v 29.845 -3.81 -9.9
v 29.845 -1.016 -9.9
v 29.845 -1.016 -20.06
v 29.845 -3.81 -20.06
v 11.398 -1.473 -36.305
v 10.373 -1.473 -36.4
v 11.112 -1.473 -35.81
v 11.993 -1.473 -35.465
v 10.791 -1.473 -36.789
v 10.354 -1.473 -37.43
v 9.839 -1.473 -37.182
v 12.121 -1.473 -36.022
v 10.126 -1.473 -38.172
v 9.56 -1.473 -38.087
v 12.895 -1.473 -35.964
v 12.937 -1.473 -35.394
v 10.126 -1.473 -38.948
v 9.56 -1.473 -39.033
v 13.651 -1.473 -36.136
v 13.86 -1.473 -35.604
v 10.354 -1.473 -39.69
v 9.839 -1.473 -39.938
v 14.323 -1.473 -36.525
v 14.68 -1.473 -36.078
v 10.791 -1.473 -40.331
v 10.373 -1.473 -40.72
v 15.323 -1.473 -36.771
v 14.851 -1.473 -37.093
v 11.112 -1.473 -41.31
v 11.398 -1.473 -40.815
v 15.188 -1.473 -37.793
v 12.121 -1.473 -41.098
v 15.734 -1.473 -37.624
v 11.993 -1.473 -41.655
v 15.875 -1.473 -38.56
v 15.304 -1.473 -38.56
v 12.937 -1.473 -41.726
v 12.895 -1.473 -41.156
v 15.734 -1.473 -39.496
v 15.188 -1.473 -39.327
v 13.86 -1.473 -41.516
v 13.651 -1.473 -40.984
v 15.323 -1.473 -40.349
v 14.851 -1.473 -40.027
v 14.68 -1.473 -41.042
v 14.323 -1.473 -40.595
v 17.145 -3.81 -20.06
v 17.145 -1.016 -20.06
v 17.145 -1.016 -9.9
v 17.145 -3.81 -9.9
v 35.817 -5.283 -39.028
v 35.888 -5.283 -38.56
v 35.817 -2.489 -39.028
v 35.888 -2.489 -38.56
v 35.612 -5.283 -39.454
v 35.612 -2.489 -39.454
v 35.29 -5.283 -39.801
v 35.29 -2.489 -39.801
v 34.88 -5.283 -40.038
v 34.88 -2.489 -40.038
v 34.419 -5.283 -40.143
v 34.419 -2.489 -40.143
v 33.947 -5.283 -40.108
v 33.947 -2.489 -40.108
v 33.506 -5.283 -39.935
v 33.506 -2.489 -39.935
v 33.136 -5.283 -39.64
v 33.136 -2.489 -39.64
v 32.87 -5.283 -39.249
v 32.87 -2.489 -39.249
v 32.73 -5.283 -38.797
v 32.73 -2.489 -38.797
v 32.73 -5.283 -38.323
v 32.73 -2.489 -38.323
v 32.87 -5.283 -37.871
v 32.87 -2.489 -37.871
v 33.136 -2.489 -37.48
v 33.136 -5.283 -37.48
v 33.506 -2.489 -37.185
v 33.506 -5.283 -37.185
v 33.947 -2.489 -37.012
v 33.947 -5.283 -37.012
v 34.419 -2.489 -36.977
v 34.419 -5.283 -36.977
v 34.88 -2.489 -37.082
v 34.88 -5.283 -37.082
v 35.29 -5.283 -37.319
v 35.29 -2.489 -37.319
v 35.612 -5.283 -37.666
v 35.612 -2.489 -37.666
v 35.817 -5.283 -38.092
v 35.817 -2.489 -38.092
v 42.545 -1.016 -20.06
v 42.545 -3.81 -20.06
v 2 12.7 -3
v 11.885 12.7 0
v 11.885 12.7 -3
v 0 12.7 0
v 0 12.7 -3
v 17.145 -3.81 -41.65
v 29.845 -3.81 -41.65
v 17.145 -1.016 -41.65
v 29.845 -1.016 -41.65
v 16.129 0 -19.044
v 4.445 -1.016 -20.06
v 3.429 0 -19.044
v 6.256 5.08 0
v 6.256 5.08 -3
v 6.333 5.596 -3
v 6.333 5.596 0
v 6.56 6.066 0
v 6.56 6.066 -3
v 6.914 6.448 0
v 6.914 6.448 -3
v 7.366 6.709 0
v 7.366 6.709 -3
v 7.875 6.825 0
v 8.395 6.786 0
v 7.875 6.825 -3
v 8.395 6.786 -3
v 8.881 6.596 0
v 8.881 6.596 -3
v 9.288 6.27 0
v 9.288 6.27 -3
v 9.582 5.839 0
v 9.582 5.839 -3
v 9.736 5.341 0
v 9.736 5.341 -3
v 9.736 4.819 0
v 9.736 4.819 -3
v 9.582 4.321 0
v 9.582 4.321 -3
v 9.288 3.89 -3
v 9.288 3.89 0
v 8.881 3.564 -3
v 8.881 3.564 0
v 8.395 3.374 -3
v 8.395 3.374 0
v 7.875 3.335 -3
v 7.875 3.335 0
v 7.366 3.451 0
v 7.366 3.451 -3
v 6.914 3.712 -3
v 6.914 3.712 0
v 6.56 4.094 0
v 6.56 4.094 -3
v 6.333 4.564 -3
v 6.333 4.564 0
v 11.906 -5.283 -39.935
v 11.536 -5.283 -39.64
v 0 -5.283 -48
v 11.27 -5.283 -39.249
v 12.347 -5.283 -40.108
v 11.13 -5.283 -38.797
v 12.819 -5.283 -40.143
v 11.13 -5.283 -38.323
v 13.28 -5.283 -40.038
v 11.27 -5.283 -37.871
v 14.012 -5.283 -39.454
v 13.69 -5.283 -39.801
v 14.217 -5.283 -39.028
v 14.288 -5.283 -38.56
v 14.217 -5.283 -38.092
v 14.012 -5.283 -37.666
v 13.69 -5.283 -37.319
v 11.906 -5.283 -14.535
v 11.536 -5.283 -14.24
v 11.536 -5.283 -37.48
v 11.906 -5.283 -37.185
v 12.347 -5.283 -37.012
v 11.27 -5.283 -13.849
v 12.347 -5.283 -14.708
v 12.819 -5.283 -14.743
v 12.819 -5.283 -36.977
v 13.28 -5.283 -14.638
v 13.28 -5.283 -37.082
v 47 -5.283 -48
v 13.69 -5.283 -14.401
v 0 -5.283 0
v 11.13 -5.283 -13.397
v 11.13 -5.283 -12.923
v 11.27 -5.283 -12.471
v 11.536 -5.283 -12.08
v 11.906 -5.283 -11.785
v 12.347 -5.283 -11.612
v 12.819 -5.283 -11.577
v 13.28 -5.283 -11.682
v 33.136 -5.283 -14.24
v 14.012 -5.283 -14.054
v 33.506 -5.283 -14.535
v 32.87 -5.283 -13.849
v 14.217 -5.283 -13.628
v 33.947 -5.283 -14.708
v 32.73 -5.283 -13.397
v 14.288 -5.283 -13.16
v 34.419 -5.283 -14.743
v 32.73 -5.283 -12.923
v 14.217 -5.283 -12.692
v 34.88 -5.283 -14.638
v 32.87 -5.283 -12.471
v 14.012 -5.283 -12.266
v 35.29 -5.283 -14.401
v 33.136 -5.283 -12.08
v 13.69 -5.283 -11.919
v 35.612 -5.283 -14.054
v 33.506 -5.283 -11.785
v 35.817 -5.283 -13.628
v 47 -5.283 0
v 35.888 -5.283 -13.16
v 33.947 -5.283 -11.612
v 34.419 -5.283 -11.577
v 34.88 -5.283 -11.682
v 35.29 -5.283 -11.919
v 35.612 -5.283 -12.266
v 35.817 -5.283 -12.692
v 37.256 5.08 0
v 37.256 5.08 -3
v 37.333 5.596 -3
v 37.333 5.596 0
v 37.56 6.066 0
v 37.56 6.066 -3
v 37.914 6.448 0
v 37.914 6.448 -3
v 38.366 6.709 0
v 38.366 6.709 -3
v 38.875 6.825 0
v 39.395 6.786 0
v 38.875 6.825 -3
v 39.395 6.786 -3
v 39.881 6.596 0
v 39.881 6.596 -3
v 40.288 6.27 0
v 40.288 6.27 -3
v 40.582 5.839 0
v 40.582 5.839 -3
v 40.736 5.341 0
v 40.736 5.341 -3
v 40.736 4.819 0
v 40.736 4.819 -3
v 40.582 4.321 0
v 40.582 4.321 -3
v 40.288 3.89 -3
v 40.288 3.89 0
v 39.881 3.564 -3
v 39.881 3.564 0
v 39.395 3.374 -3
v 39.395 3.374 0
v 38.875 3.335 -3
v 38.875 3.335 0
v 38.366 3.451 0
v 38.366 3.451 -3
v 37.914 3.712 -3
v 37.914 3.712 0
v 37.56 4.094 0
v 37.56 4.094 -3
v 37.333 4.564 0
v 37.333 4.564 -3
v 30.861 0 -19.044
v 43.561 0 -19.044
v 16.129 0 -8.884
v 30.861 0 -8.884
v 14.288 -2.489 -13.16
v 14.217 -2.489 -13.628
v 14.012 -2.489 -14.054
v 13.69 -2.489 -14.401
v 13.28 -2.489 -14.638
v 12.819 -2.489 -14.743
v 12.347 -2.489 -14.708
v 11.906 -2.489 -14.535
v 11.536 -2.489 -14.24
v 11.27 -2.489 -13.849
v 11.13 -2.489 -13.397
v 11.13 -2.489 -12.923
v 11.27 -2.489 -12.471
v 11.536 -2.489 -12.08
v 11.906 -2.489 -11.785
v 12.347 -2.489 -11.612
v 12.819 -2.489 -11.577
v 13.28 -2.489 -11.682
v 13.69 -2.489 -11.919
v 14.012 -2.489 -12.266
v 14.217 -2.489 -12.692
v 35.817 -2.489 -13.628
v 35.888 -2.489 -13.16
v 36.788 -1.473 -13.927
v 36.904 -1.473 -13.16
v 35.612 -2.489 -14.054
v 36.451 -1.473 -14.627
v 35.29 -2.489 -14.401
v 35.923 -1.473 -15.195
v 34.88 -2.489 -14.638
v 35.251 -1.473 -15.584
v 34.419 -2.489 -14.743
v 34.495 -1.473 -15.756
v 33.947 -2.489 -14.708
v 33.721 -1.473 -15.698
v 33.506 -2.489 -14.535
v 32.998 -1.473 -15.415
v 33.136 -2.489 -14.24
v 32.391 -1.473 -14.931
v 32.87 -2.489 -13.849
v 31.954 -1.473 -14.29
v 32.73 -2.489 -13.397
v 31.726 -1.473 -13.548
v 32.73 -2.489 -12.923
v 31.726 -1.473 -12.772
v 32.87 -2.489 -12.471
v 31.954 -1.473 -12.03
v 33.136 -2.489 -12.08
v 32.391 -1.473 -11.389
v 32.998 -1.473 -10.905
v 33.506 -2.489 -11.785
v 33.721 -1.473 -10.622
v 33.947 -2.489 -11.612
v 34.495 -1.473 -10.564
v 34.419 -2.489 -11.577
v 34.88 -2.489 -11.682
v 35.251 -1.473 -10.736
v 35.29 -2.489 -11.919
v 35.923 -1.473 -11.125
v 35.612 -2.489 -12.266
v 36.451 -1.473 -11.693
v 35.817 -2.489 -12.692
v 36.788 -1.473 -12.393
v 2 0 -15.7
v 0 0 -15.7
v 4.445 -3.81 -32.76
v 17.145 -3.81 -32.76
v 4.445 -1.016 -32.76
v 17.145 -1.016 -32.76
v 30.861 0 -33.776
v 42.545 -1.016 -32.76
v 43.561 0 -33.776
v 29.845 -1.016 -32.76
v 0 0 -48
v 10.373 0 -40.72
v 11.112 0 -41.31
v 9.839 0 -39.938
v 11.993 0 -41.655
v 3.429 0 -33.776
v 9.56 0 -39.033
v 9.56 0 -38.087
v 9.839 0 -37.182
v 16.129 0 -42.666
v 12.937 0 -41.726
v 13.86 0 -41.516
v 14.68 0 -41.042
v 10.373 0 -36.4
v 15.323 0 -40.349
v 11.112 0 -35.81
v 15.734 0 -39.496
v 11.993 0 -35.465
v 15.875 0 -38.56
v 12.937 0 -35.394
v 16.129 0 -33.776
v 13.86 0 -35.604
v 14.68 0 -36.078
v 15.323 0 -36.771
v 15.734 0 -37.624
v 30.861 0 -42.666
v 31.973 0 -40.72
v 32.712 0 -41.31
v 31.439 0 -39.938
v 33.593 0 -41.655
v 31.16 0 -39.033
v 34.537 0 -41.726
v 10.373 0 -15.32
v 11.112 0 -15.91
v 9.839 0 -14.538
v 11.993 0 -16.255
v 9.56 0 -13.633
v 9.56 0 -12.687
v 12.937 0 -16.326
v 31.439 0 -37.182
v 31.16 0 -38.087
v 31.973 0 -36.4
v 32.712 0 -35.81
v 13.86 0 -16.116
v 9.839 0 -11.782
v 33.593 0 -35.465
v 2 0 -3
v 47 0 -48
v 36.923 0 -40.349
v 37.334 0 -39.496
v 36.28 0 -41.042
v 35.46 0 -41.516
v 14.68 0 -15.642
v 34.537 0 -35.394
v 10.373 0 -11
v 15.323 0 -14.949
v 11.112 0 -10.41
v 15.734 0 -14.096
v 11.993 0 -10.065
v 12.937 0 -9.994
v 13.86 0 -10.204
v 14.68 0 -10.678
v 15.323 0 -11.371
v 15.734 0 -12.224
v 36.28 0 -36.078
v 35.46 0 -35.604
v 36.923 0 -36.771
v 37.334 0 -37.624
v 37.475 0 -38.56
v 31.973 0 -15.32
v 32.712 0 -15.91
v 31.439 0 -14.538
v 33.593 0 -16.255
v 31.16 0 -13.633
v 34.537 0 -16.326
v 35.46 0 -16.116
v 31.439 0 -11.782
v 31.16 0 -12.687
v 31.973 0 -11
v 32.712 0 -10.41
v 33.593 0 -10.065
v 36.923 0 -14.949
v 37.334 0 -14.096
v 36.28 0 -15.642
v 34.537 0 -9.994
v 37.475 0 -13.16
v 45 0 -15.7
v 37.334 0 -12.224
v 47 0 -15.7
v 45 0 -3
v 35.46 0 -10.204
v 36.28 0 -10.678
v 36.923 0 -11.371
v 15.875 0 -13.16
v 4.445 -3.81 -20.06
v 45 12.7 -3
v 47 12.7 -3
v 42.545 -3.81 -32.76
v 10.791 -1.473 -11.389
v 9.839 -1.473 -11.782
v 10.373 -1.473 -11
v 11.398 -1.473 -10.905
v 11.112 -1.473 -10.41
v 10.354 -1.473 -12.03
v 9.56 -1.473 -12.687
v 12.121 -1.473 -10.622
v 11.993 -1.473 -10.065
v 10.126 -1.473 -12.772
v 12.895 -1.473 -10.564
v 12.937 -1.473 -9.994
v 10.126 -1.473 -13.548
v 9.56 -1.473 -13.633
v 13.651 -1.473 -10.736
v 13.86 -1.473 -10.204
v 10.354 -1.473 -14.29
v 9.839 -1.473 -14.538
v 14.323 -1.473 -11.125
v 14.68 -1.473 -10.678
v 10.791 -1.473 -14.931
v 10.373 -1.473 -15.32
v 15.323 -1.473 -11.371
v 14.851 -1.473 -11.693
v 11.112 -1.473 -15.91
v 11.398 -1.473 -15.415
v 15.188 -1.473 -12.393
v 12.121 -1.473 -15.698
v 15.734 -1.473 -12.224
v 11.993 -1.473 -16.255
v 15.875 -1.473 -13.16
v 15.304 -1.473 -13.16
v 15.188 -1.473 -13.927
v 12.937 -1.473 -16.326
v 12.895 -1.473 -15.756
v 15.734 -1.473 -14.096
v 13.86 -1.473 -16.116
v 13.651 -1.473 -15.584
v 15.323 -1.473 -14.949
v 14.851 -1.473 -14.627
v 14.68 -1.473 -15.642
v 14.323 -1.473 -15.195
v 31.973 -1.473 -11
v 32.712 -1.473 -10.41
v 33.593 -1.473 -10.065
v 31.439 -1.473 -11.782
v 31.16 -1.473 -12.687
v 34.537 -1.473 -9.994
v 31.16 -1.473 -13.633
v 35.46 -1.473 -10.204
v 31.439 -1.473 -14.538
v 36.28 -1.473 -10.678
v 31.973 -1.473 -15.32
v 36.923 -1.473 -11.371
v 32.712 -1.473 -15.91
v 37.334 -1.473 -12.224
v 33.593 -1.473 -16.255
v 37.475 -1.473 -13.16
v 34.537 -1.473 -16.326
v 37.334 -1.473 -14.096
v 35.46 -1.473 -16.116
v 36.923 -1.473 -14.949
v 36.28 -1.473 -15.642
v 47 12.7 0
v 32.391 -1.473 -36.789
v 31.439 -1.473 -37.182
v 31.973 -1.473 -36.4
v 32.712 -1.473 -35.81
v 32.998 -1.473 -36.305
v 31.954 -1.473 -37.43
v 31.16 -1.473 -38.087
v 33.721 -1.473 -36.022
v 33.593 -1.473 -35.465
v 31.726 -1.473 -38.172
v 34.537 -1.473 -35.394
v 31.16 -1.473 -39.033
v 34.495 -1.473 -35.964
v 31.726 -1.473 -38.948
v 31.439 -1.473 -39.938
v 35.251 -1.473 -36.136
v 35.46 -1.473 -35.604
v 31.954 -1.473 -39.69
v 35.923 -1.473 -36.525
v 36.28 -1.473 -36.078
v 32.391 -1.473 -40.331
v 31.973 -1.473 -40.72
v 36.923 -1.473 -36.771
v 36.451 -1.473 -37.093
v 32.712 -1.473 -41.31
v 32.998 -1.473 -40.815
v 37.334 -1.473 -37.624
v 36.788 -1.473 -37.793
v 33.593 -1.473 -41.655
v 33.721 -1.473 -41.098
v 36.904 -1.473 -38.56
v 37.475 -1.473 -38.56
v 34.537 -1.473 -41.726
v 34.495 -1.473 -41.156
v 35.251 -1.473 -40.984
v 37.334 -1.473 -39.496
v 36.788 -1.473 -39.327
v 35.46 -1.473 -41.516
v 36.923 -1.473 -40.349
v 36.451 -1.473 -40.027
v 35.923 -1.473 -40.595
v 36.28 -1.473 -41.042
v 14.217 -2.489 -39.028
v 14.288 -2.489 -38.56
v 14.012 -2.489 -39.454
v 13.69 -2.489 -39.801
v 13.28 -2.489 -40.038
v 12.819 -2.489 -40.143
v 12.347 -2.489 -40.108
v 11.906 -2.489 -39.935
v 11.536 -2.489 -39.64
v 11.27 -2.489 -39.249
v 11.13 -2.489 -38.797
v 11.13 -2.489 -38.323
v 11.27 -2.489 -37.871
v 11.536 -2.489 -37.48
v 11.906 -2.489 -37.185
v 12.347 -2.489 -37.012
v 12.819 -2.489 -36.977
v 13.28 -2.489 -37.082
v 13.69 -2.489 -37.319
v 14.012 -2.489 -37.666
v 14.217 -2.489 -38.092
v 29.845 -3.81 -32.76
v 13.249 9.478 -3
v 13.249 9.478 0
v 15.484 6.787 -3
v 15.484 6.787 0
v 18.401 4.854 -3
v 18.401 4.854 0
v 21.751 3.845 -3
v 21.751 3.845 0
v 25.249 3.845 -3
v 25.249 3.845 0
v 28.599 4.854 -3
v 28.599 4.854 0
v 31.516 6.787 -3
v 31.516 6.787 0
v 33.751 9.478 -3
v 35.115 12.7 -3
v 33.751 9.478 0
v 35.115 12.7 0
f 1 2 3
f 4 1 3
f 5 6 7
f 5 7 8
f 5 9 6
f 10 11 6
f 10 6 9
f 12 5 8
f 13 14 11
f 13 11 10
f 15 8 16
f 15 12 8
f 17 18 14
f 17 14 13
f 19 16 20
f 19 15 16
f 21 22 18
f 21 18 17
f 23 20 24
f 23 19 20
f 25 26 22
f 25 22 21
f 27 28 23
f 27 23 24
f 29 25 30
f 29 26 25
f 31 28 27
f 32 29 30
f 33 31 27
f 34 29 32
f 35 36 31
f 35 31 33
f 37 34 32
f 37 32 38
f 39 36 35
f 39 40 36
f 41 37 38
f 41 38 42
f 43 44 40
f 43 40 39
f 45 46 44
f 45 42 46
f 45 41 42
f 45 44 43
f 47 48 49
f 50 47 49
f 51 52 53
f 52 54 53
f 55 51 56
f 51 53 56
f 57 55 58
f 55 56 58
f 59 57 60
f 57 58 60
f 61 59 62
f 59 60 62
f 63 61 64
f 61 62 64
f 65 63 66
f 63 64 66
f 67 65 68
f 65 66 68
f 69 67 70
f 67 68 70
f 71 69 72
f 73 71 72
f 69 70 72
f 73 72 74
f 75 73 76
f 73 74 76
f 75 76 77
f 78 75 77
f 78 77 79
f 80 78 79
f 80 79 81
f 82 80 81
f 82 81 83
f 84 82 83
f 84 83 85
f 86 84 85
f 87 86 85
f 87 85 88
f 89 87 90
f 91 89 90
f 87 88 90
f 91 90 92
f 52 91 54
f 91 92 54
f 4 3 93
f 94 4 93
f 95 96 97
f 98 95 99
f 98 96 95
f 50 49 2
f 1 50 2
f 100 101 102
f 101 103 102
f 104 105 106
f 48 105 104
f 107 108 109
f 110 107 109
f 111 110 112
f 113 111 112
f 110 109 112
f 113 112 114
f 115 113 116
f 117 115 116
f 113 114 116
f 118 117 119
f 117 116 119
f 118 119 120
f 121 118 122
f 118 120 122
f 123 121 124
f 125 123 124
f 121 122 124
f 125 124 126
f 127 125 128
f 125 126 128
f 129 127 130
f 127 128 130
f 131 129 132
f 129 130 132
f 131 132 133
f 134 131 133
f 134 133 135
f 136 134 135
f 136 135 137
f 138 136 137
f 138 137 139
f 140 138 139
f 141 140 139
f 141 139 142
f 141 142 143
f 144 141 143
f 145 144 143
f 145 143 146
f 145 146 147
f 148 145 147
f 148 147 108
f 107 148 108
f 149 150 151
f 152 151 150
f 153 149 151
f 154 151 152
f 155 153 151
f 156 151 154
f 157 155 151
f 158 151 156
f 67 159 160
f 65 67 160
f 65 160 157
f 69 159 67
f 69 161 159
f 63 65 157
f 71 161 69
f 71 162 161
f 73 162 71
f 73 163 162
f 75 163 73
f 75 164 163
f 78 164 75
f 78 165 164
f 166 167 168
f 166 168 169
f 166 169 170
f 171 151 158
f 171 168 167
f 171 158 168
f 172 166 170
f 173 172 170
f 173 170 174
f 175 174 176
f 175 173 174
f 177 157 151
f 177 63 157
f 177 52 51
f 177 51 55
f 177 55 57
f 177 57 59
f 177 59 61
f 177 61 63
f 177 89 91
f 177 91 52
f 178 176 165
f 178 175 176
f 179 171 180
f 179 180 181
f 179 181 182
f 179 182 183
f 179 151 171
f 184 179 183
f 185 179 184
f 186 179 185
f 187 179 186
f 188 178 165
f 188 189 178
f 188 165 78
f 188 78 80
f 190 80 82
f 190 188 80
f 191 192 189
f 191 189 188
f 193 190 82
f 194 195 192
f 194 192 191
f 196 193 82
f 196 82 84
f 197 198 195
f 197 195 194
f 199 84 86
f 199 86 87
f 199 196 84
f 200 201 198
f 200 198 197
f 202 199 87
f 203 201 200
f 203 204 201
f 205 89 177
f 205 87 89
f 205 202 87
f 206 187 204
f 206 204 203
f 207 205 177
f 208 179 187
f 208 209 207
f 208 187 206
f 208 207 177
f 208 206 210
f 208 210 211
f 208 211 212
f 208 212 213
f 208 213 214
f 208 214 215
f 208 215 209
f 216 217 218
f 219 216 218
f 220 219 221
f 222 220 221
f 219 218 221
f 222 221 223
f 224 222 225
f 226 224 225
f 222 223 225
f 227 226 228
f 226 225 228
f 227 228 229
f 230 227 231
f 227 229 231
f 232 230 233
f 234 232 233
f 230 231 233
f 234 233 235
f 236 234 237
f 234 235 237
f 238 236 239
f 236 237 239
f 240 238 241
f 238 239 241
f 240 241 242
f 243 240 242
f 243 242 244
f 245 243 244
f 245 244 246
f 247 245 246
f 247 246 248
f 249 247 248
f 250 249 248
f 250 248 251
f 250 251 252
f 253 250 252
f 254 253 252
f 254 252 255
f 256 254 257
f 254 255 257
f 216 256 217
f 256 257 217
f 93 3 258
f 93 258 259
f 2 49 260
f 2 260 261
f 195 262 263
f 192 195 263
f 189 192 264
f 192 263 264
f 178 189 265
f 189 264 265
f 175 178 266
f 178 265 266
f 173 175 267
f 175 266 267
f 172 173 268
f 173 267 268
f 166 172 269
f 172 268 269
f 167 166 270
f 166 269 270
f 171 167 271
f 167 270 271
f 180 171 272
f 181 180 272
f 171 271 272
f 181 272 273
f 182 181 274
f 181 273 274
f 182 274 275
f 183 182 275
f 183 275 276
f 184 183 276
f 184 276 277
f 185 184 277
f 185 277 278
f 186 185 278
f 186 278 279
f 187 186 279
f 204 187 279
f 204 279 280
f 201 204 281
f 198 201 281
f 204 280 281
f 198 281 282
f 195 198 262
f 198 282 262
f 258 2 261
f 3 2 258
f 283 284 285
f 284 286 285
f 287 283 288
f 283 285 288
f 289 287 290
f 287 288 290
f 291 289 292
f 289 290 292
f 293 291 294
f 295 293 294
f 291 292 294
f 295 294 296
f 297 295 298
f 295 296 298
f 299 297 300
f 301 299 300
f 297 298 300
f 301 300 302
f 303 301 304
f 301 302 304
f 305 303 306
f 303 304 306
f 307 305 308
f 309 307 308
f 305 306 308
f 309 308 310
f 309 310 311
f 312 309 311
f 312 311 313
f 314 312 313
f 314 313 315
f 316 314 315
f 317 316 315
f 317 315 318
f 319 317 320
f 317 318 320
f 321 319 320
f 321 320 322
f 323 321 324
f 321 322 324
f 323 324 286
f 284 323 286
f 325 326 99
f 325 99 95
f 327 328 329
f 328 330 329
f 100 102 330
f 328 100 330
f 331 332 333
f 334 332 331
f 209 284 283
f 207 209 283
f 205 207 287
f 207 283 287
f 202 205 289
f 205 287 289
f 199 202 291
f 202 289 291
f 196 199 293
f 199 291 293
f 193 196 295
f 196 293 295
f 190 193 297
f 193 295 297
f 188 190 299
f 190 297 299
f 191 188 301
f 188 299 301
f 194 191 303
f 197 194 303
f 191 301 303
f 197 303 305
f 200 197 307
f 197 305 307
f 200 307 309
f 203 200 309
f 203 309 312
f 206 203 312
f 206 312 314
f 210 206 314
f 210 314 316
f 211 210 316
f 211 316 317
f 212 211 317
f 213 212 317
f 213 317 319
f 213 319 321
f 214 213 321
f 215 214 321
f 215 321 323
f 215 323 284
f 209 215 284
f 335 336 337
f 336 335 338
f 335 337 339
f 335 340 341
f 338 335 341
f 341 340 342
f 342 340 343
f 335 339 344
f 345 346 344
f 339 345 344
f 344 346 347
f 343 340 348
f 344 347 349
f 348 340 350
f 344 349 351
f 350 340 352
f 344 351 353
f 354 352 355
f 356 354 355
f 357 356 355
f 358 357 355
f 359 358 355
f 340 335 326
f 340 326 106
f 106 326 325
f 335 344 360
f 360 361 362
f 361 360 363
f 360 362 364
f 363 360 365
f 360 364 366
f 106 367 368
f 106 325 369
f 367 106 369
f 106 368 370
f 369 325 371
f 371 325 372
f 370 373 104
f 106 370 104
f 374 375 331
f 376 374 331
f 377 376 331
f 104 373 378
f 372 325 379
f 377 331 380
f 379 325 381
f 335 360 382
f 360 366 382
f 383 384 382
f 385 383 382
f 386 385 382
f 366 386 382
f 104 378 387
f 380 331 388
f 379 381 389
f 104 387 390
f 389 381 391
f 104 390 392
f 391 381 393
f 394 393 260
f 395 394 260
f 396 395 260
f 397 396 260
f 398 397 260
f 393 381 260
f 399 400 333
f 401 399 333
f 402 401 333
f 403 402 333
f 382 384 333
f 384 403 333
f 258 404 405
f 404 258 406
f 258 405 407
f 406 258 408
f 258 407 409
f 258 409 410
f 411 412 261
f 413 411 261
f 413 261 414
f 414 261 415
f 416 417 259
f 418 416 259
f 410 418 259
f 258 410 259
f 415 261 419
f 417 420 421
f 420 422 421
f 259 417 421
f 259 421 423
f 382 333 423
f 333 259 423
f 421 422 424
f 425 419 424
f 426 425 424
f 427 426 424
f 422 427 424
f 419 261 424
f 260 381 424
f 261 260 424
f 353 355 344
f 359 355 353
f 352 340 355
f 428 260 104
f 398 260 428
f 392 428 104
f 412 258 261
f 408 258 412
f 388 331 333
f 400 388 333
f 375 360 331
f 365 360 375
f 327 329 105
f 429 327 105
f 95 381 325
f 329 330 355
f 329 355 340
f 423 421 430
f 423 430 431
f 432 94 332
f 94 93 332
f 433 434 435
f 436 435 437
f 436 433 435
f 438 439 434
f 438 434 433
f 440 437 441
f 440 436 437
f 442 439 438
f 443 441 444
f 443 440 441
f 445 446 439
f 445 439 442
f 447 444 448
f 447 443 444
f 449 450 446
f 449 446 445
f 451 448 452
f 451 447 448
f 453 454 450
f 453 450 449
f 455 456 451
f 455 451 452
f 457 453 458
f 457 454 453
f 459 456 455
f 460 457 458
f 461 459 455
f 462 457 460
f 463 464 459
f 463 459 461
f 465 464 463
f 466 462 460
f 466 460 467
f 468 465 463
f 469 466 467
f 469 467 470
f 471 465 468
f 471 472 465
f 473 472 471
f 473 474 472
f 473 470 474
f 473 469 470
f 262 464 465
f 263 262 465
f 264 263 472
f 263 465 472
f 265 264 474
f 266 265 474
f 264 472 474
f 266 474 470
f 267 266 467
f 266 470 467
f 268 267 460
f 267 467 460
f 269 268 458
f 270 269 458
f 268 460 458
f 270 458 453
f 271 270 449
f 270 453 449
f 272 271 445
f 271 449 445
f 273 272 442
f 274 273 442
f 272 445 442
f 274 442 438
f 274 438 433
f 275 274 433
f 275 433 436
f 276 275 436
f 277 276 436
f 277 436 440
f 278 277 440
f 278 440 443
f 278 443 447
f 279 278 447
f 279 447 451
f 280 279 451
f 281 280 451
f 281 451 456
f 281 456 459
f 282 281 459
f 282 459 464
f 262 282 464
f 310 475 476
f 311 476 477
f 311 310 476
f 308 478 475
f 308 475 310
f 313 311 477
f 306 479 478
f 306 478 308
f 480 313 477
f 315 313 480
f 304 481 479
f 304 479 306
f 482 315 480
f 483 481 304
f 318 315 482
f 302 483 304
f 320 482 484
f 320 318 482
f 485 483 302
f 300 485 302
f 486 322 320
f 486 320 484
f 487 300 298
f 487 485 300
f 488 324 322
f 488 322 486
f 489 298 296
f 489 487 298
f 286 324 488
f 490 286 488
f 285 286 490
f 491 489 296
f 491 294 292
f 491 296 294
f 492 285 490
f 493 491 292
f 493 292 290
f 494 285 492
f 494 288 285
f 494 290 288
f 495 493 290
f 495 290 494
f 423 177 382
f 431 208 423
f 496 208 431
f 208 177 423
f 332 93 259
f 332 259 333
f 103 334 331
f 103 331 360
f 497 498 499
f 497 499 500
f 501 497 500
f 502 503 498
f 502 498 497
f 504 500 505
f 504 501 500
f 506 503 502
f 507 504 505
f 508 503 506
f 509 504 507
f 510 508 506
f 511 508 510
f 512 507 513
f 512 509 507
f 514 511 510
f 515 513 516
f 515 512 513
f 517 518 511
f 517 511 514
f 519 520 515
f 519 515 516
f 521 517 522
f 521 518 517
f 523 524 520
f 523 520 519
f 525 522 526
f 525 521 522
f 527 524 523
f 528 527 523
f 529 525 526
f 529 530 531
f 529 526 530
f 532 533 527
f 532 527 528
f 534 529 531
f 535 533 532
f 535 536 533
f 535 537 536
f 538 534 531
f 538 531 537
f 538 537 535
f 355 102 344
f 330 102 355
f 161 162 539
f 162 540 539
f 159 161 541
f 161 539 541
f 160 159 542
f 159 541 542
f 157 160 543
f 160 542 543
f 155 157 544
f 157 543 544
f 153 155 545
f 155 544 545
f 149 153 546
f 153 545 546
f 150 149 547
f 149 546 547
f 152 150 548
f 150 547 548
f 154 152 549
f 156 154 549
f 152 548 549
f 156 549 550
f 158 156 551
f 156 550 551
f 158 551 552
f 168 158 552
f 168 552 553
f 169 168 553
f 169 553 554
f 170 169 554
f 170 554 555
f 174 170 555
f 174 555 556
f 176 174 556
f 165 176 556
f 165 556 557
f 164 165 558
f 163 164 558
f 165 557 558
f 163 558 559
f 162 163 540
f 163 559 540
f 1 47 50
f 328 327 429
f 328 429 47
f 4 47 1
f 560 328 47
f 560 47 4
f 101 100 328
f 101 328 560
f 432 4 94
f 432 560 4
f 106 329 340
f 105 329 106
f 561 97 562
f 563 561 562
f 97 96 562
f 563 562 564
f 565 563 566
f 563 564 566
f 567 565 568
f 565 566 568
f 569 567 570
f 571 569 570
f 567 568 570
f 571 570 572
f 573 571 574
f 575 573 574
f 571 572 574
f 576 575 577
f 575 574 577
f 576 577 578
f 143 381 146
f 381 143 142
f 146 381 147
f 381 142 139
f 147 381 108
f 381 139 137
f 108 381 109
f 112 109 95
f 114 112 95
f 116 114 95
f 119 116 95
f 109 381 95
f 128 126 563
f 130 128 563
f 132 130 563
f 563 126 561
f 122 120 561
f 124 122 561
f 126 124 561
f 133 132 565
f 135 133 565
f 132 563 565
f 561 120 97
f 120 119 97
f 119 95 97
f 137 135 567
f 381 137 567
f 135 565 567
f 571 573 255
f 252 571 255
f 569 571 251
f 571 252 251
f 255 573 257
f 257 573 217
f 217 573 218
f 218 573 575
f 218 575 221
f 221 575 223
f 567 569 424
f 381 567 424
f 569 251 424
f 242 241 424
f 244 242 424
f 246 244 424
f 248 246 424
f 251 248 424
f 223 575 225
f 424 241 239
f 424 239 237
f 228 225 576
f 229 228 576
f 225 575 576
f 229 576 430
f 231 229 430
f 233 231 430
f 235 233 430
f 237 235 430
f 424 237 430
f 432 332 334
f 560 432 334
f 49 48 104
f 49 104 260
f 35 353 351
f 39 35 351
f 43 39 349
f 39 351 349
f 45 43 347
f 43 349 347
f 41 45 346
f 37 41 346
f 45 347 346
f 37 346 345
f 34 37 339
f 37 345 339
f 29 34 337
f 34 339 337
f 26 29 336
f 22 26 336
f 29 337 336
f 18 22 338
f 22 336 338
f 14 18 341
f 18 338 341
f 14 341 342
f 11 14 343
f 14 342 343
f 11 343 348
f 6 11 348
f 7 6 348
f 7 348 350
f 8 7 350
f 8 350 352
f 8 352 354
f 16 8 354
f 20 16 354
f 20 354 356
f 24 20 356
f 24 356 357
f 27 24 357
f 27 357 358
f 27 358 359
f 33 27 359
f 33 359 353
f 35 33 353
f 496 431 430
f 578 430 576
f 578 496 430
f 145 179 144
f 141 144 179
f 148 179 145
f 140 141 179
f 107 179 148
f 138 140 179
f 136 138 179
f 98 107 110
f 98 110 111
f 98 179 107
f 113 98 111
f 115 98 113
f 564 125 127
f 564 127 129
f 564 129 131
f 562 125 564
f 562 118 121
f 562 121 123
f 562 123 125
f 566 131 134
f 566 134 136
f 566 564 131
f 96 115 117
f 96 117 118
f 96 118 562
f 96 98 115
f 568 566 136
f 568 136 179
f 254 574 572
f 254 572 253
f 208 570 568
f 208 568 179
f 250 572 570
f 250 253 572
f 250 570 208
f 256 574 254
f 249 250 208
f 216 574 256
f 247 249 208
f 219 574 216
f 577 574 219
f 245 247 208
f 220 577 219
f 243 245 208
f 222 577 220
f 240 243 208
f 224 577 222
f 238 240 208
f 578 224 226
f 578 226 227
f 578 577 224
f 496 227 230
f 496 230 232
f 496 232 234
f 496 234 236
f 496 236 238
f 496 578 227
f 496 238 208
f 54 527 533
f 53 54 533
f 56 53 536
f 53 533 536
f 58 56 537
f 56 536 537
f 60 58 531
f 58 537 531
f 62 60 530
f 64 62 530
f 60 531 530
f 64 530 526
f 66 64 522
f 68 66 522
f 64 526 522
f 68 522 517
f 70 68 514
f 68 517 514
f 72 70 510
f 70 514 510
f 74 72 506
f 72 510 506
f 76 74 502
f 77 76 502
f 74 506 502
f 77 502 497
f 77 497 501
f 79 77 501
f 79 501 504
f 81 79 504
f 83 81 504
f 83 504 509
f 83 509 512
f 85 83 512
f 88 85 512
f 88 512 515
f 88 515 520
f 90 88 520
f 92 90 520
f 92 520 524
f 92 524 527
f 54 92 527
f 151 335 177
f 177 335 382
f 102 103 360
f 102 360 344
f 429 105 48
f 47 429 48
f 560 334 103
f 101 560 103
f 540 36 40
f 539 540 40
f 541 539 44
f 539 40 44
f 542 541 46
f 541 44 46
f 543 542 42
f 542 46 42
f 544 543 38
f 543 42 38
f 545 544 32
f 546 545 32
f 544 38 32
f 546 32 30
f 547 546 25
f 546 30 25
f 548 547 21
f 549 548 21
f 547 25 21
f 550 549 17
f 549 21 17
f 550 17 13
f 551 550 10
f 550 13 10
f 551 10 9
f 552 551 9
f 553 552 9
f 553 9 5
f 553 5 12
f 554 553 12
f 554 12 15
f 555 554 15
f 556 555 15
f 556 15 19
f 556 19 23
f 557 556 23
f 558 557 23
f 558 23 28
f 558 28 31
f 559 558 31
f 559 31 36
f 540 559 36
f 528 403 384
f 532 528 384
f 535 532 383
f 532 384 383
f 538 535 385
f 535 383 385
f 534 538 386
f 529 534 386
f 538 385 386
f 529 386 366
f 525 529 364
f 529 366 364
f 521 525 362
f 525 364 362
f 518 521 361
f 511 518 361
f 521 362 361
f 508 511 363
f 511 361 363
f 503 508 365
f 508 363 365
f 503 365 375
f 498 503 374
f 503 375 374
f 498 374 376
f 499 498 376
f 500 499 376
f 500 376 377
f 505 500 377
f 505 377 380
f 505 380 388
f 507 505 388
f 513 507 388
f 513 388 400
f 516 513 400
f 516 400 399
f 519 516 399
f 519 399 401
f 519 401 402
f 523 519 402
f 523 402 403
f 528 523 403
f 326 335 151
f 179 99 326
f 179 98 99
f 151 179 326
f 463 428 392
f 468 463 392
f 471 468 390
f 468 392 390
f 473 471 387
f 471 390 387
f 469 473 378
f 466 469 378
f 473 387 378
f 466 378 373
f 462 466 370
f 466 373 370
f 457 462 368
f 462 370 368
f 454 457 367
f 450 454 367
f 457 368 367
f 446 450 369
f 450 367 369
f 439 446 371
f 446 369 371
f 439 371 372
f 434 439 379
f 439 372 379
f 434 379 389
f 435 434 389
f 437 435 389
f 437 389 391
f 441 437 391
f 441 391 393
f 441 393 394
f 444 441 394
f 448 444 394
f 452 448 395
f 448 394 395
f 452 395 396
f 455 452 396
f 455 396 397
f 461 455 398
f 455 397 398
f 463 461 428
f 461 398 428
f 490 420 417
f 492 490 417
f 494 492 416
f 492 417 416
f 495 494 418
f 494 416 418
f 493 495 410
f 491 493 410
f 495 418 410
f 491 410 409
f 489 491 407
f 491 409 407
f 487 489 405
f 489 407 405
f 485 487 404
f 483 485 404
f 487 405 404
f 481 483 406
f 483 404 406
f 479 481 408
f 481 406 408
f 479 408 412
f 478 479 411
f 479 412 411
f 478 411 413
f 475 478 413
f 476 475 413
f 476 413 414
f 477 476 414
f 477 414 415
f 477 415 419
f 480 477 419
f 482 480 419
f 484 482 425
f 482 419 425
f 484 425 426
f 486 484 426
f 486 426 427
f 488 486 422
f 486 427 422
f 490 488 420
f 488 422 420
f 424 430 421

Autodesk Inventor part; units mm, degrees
ref_plane "YZ Plane" through (0, 0, 0) normal (1, 0, 0) x (0, 1, 0)
ref_plane "XZ Plane" through (0, 0, 0) normal (0, 1, 0) x (-1, 0, 0)
ref_plane "XY Plane" through (0, 0, 0) normal (0, 0, 1) x (1, 0, 0)
sketch "Sketch1" plane through (0, 0, 0) normal (0, 0, 1) x (1, 0, 0)
  line L0 (0, 0) -> (47, 0)
  line L1 (47, 0) -> (47, 12.7)
  line L2 (47, 12.7) -> (0, 12.7)
  line L3 (0, 12.7) -> (0, 0)
  dimension "d0" = 47
  dimension "d1" = 12.7
extrude "Extrusion1" add sketch "Sketch1" against normal blind 3
sketch "Sketch2" plane through (0, 0, 0) normal (0, -1, 0) x (1, 0, 0)
  line L0 (47, 0) -> (0, 0)
  line L1 (0, 0) -> (0, -48)
  line L2 (0, -48) -> (47, -48)
  line L3 (47, -48) -> (47, 0)
  line L4 (47, 0) -> (47, -3) projected
  line L5 (47, 0) -> (0, 0) projected
  dimension "d6" = 0
  dimension "d24" = 48
  dimension "d25" = 0
extrude "Extrusion2" add sketch "Sketch2" along normal blind 5.2832
sketch "Sketch3" plane through (0, 0, -3) normal (0, 0, -1) x (-1, 0, 0)
  line L0 (-47, 12.7) -> (-47, 0) projected
  line L1 (-47, 0) -> (0, 0) projected
  line L2 (-47, 12.7) -> (-45, 12.7)
  line L3 (-45, 12.7) -> (-45, 0)
  line L4 (-45, 0) -> (-47, 0)
  line L5 (-47, 0) -> (-47, 12.7)
  line L6 (0, 0) -> (0, 12.7) projected
  line L7 (0, 0) -> (-2, 0)
  line L8 (-2, 0) -> (-2, 12.7)
  line L9 (-2, 12.7) -> (0, 12.7)
  line L10 (0, 12.7) -> (0, 0)
  dimension "d7" = 2
  dimension "d8" = 2
  dimension "d9" = 12.7
extrude "Extrusion3" add sketch "Sketch3" along normal blind 12.7
chamfer "Chamfer1" distance 12.7 angle 45 2 edges at (46, 12.7, -15.7) (1, 12.7, -15.7)
sketch "Sketch4" plane through (0, 0, -3) normal (0, 0, -1) x (-1, 0, 0)
  circle A0 centre (-39.0056, 5.08) radius 1.75
  circle A1 centre (-8.0056, 5.08) radius 1.75
  line L0 (-45, 0) -> (-45, 12.7) projected
  line L1 (-2, 12.7) -> (-2, 0) projected
  line L2 (0, 0) -> (-47, 0) projected
  dimension "d15" = 3.5
  dimension "d16" = 3.5
  dimension "d17" = 5.9944
  dimension "d18" = 31
  dimension "d19" = 6.0056
  dimension "d20" = 5.08
  dimension "d21" = 5.08
extrude "Extrusion4" cut sketch "Sketch4" against normal blind 12.7
sketch "Sketch5" plane through (0, 0, 0) normal (0, 0, 1) x (1, 0, 0)
  circle A0 centre (23.5, 15.7168) radius 12
  line L0 (47, -5.2832) -> (47, 12.7) projected
  line L1 (47, -5.2832) -> (0, -5.2832) projected
  point P0 (0, 0)
  dimension "d26" = 24
  dimension "d27" = 23.5
  dimension "d28" = 21
extrude "Extrusion5" cut sketch "Sketch5" against normal blind 5.2832
sketch "Sketch6" plane through (0, 0, 0) normal (0, 1, 0) x (1, 0, 0)
  circle A0 centre (12.7, 13.16) radius 1.5875
  circle A1 centre (12.7, 38.56) radius 1.5875
  circle A2 centre (34.3, 38.56) radius 1.5875
  circle A3 centre (34.3, 13.16) radius 1.5875
  line L0 (2, 3) -> (11.8854, 3) projected
  line L1 (0, 15.7) -> (0, 48) projected
  line L2 (47, 48) -> (47, 15.7) projected
  point P0 (0, 0)
  dimension "d31" = 3.175
  dimension "d32" = 3.175
  dimension "d33" = 3.175
  dimension "d34" = 3.175
  dimension "d35" = 10.16
  dimension "d36" = 25.4
  dimension "d37" = 25.4
  dimension "d38" = 10.16
  dimension "d39" = 12.7
  dimension "d40" = 12.7
  dimension "d41" = 12.7
  dimension "d42" = 12.7
extrude "Extrusion6" cut sketch "Sketch6" against normal blind 5.2832
sketch "Sketch7" plane through (0, 0, 0) normal (0, 1, 0) x (1, 0, 0)
  circle A0 centre (12.7, 13.16) radius 1.5875 projected
  circle A1 centre (12.7, 13.16) radius 3.175
  circle A2 centre (12.7, 38.56) radius 1.5875 projected
  circle A3 centre (12.7, 38.56) radius 3.175
  circle A4 centre (34.3, 13.16) radius 1.5875 projected
  circle A5 centre (34.3, 13.16) radius 3.175
  circle A6 centre (34.3, 38.56) radius 1.5875 projected
  circle A7 centre (34.3, 38.56) radius 3.175
  point P0 (0, 0)
  dimension "d45" = 6.35
  dimension "d46" = 6.35
  dimension "d47" = 6.35
  dimension "d48" = 6.35
extrude "Extrusion7" cut sketch "Sketch7" against normal blind 1.4732 contours A0 | A1 | A2 | A3 | A4 | A5 | A6 | A7
chamfer "Chamfer2" distance 1.016 angle 45 4 edges at (11.1125, -1.4732, -13.16) (32.7125, -1.4732, -13.16) (11.1125, -1.4732, -38.56) (32.7125, -1.4732, -38.56)
sketch "Sketch8" plane through (0, 0, 0) normal (0, 1, 0) x (1, 0, 0)
  line L0 (4.445, 20.06) -> (42.545, 20.06)
  line L1 (42.545, 20.06) -> (42.545, 32.76)
  line L2 (42.545, 32.76) -> (4.445, 32.76)
  line L3 (4.445, 32.76) -> (4.445, 20.06)
  line L4 (17.145, 9.9) -> (29.845, 9.9)
  line L5 (29.845, 9.9) -> (29.845, 41.65)
  line L6 (29.845, 41.65) -> (17.145, 41.65)
  line L7 (17.145, 41.65) -> (17.145, 9.9)
  line L8 (0, 15.7) -> (0, 48) projected
  line L9 (47, 48) -> (47, 15.7) projected
  line L10 (0, 48) -> (47, 48) projected
  point P0 (0, 0)
  point P1 (17.145, 20.06)
  point P2 (29.845, 20.06)
  point P3 (29.845, 32.76)
  point P4 (17.145, 32.76)
  dimension "d54" = 12.7
  dimension "d55" = 38.1
  dimension "d56" = 4.445
  dimension "d57" = 4.455
  dimension "d58" = 15.24
  dimension "d59" = 12.7
  dimension "d60" = 17.145
  dimension "d61" = 17.155
  dimension "d62" = 31.75
  dimension "d63" = 6.35
extrude "Extrusion8" cut sketch "Sketch8" against normal blind 3.81
chamfer "Chamfer3" distance 1.016 angle 45 12 edges at (10.795, 0, -20.06) (4.445, 0, -26.41) (10.795, 0, -32.76) (17.145, 0, -37.205) (23.495, 0, -41.65) (29.845, 0, -37.205) (36.195, 0, -32.76) (42.545, 0, -26.41) (36.195, 0, -20.06) (29.845, 0, -14.98) (23.495, 0, -9.9) (17.145, 0, -14.98)
properties part number "StepperMount"
